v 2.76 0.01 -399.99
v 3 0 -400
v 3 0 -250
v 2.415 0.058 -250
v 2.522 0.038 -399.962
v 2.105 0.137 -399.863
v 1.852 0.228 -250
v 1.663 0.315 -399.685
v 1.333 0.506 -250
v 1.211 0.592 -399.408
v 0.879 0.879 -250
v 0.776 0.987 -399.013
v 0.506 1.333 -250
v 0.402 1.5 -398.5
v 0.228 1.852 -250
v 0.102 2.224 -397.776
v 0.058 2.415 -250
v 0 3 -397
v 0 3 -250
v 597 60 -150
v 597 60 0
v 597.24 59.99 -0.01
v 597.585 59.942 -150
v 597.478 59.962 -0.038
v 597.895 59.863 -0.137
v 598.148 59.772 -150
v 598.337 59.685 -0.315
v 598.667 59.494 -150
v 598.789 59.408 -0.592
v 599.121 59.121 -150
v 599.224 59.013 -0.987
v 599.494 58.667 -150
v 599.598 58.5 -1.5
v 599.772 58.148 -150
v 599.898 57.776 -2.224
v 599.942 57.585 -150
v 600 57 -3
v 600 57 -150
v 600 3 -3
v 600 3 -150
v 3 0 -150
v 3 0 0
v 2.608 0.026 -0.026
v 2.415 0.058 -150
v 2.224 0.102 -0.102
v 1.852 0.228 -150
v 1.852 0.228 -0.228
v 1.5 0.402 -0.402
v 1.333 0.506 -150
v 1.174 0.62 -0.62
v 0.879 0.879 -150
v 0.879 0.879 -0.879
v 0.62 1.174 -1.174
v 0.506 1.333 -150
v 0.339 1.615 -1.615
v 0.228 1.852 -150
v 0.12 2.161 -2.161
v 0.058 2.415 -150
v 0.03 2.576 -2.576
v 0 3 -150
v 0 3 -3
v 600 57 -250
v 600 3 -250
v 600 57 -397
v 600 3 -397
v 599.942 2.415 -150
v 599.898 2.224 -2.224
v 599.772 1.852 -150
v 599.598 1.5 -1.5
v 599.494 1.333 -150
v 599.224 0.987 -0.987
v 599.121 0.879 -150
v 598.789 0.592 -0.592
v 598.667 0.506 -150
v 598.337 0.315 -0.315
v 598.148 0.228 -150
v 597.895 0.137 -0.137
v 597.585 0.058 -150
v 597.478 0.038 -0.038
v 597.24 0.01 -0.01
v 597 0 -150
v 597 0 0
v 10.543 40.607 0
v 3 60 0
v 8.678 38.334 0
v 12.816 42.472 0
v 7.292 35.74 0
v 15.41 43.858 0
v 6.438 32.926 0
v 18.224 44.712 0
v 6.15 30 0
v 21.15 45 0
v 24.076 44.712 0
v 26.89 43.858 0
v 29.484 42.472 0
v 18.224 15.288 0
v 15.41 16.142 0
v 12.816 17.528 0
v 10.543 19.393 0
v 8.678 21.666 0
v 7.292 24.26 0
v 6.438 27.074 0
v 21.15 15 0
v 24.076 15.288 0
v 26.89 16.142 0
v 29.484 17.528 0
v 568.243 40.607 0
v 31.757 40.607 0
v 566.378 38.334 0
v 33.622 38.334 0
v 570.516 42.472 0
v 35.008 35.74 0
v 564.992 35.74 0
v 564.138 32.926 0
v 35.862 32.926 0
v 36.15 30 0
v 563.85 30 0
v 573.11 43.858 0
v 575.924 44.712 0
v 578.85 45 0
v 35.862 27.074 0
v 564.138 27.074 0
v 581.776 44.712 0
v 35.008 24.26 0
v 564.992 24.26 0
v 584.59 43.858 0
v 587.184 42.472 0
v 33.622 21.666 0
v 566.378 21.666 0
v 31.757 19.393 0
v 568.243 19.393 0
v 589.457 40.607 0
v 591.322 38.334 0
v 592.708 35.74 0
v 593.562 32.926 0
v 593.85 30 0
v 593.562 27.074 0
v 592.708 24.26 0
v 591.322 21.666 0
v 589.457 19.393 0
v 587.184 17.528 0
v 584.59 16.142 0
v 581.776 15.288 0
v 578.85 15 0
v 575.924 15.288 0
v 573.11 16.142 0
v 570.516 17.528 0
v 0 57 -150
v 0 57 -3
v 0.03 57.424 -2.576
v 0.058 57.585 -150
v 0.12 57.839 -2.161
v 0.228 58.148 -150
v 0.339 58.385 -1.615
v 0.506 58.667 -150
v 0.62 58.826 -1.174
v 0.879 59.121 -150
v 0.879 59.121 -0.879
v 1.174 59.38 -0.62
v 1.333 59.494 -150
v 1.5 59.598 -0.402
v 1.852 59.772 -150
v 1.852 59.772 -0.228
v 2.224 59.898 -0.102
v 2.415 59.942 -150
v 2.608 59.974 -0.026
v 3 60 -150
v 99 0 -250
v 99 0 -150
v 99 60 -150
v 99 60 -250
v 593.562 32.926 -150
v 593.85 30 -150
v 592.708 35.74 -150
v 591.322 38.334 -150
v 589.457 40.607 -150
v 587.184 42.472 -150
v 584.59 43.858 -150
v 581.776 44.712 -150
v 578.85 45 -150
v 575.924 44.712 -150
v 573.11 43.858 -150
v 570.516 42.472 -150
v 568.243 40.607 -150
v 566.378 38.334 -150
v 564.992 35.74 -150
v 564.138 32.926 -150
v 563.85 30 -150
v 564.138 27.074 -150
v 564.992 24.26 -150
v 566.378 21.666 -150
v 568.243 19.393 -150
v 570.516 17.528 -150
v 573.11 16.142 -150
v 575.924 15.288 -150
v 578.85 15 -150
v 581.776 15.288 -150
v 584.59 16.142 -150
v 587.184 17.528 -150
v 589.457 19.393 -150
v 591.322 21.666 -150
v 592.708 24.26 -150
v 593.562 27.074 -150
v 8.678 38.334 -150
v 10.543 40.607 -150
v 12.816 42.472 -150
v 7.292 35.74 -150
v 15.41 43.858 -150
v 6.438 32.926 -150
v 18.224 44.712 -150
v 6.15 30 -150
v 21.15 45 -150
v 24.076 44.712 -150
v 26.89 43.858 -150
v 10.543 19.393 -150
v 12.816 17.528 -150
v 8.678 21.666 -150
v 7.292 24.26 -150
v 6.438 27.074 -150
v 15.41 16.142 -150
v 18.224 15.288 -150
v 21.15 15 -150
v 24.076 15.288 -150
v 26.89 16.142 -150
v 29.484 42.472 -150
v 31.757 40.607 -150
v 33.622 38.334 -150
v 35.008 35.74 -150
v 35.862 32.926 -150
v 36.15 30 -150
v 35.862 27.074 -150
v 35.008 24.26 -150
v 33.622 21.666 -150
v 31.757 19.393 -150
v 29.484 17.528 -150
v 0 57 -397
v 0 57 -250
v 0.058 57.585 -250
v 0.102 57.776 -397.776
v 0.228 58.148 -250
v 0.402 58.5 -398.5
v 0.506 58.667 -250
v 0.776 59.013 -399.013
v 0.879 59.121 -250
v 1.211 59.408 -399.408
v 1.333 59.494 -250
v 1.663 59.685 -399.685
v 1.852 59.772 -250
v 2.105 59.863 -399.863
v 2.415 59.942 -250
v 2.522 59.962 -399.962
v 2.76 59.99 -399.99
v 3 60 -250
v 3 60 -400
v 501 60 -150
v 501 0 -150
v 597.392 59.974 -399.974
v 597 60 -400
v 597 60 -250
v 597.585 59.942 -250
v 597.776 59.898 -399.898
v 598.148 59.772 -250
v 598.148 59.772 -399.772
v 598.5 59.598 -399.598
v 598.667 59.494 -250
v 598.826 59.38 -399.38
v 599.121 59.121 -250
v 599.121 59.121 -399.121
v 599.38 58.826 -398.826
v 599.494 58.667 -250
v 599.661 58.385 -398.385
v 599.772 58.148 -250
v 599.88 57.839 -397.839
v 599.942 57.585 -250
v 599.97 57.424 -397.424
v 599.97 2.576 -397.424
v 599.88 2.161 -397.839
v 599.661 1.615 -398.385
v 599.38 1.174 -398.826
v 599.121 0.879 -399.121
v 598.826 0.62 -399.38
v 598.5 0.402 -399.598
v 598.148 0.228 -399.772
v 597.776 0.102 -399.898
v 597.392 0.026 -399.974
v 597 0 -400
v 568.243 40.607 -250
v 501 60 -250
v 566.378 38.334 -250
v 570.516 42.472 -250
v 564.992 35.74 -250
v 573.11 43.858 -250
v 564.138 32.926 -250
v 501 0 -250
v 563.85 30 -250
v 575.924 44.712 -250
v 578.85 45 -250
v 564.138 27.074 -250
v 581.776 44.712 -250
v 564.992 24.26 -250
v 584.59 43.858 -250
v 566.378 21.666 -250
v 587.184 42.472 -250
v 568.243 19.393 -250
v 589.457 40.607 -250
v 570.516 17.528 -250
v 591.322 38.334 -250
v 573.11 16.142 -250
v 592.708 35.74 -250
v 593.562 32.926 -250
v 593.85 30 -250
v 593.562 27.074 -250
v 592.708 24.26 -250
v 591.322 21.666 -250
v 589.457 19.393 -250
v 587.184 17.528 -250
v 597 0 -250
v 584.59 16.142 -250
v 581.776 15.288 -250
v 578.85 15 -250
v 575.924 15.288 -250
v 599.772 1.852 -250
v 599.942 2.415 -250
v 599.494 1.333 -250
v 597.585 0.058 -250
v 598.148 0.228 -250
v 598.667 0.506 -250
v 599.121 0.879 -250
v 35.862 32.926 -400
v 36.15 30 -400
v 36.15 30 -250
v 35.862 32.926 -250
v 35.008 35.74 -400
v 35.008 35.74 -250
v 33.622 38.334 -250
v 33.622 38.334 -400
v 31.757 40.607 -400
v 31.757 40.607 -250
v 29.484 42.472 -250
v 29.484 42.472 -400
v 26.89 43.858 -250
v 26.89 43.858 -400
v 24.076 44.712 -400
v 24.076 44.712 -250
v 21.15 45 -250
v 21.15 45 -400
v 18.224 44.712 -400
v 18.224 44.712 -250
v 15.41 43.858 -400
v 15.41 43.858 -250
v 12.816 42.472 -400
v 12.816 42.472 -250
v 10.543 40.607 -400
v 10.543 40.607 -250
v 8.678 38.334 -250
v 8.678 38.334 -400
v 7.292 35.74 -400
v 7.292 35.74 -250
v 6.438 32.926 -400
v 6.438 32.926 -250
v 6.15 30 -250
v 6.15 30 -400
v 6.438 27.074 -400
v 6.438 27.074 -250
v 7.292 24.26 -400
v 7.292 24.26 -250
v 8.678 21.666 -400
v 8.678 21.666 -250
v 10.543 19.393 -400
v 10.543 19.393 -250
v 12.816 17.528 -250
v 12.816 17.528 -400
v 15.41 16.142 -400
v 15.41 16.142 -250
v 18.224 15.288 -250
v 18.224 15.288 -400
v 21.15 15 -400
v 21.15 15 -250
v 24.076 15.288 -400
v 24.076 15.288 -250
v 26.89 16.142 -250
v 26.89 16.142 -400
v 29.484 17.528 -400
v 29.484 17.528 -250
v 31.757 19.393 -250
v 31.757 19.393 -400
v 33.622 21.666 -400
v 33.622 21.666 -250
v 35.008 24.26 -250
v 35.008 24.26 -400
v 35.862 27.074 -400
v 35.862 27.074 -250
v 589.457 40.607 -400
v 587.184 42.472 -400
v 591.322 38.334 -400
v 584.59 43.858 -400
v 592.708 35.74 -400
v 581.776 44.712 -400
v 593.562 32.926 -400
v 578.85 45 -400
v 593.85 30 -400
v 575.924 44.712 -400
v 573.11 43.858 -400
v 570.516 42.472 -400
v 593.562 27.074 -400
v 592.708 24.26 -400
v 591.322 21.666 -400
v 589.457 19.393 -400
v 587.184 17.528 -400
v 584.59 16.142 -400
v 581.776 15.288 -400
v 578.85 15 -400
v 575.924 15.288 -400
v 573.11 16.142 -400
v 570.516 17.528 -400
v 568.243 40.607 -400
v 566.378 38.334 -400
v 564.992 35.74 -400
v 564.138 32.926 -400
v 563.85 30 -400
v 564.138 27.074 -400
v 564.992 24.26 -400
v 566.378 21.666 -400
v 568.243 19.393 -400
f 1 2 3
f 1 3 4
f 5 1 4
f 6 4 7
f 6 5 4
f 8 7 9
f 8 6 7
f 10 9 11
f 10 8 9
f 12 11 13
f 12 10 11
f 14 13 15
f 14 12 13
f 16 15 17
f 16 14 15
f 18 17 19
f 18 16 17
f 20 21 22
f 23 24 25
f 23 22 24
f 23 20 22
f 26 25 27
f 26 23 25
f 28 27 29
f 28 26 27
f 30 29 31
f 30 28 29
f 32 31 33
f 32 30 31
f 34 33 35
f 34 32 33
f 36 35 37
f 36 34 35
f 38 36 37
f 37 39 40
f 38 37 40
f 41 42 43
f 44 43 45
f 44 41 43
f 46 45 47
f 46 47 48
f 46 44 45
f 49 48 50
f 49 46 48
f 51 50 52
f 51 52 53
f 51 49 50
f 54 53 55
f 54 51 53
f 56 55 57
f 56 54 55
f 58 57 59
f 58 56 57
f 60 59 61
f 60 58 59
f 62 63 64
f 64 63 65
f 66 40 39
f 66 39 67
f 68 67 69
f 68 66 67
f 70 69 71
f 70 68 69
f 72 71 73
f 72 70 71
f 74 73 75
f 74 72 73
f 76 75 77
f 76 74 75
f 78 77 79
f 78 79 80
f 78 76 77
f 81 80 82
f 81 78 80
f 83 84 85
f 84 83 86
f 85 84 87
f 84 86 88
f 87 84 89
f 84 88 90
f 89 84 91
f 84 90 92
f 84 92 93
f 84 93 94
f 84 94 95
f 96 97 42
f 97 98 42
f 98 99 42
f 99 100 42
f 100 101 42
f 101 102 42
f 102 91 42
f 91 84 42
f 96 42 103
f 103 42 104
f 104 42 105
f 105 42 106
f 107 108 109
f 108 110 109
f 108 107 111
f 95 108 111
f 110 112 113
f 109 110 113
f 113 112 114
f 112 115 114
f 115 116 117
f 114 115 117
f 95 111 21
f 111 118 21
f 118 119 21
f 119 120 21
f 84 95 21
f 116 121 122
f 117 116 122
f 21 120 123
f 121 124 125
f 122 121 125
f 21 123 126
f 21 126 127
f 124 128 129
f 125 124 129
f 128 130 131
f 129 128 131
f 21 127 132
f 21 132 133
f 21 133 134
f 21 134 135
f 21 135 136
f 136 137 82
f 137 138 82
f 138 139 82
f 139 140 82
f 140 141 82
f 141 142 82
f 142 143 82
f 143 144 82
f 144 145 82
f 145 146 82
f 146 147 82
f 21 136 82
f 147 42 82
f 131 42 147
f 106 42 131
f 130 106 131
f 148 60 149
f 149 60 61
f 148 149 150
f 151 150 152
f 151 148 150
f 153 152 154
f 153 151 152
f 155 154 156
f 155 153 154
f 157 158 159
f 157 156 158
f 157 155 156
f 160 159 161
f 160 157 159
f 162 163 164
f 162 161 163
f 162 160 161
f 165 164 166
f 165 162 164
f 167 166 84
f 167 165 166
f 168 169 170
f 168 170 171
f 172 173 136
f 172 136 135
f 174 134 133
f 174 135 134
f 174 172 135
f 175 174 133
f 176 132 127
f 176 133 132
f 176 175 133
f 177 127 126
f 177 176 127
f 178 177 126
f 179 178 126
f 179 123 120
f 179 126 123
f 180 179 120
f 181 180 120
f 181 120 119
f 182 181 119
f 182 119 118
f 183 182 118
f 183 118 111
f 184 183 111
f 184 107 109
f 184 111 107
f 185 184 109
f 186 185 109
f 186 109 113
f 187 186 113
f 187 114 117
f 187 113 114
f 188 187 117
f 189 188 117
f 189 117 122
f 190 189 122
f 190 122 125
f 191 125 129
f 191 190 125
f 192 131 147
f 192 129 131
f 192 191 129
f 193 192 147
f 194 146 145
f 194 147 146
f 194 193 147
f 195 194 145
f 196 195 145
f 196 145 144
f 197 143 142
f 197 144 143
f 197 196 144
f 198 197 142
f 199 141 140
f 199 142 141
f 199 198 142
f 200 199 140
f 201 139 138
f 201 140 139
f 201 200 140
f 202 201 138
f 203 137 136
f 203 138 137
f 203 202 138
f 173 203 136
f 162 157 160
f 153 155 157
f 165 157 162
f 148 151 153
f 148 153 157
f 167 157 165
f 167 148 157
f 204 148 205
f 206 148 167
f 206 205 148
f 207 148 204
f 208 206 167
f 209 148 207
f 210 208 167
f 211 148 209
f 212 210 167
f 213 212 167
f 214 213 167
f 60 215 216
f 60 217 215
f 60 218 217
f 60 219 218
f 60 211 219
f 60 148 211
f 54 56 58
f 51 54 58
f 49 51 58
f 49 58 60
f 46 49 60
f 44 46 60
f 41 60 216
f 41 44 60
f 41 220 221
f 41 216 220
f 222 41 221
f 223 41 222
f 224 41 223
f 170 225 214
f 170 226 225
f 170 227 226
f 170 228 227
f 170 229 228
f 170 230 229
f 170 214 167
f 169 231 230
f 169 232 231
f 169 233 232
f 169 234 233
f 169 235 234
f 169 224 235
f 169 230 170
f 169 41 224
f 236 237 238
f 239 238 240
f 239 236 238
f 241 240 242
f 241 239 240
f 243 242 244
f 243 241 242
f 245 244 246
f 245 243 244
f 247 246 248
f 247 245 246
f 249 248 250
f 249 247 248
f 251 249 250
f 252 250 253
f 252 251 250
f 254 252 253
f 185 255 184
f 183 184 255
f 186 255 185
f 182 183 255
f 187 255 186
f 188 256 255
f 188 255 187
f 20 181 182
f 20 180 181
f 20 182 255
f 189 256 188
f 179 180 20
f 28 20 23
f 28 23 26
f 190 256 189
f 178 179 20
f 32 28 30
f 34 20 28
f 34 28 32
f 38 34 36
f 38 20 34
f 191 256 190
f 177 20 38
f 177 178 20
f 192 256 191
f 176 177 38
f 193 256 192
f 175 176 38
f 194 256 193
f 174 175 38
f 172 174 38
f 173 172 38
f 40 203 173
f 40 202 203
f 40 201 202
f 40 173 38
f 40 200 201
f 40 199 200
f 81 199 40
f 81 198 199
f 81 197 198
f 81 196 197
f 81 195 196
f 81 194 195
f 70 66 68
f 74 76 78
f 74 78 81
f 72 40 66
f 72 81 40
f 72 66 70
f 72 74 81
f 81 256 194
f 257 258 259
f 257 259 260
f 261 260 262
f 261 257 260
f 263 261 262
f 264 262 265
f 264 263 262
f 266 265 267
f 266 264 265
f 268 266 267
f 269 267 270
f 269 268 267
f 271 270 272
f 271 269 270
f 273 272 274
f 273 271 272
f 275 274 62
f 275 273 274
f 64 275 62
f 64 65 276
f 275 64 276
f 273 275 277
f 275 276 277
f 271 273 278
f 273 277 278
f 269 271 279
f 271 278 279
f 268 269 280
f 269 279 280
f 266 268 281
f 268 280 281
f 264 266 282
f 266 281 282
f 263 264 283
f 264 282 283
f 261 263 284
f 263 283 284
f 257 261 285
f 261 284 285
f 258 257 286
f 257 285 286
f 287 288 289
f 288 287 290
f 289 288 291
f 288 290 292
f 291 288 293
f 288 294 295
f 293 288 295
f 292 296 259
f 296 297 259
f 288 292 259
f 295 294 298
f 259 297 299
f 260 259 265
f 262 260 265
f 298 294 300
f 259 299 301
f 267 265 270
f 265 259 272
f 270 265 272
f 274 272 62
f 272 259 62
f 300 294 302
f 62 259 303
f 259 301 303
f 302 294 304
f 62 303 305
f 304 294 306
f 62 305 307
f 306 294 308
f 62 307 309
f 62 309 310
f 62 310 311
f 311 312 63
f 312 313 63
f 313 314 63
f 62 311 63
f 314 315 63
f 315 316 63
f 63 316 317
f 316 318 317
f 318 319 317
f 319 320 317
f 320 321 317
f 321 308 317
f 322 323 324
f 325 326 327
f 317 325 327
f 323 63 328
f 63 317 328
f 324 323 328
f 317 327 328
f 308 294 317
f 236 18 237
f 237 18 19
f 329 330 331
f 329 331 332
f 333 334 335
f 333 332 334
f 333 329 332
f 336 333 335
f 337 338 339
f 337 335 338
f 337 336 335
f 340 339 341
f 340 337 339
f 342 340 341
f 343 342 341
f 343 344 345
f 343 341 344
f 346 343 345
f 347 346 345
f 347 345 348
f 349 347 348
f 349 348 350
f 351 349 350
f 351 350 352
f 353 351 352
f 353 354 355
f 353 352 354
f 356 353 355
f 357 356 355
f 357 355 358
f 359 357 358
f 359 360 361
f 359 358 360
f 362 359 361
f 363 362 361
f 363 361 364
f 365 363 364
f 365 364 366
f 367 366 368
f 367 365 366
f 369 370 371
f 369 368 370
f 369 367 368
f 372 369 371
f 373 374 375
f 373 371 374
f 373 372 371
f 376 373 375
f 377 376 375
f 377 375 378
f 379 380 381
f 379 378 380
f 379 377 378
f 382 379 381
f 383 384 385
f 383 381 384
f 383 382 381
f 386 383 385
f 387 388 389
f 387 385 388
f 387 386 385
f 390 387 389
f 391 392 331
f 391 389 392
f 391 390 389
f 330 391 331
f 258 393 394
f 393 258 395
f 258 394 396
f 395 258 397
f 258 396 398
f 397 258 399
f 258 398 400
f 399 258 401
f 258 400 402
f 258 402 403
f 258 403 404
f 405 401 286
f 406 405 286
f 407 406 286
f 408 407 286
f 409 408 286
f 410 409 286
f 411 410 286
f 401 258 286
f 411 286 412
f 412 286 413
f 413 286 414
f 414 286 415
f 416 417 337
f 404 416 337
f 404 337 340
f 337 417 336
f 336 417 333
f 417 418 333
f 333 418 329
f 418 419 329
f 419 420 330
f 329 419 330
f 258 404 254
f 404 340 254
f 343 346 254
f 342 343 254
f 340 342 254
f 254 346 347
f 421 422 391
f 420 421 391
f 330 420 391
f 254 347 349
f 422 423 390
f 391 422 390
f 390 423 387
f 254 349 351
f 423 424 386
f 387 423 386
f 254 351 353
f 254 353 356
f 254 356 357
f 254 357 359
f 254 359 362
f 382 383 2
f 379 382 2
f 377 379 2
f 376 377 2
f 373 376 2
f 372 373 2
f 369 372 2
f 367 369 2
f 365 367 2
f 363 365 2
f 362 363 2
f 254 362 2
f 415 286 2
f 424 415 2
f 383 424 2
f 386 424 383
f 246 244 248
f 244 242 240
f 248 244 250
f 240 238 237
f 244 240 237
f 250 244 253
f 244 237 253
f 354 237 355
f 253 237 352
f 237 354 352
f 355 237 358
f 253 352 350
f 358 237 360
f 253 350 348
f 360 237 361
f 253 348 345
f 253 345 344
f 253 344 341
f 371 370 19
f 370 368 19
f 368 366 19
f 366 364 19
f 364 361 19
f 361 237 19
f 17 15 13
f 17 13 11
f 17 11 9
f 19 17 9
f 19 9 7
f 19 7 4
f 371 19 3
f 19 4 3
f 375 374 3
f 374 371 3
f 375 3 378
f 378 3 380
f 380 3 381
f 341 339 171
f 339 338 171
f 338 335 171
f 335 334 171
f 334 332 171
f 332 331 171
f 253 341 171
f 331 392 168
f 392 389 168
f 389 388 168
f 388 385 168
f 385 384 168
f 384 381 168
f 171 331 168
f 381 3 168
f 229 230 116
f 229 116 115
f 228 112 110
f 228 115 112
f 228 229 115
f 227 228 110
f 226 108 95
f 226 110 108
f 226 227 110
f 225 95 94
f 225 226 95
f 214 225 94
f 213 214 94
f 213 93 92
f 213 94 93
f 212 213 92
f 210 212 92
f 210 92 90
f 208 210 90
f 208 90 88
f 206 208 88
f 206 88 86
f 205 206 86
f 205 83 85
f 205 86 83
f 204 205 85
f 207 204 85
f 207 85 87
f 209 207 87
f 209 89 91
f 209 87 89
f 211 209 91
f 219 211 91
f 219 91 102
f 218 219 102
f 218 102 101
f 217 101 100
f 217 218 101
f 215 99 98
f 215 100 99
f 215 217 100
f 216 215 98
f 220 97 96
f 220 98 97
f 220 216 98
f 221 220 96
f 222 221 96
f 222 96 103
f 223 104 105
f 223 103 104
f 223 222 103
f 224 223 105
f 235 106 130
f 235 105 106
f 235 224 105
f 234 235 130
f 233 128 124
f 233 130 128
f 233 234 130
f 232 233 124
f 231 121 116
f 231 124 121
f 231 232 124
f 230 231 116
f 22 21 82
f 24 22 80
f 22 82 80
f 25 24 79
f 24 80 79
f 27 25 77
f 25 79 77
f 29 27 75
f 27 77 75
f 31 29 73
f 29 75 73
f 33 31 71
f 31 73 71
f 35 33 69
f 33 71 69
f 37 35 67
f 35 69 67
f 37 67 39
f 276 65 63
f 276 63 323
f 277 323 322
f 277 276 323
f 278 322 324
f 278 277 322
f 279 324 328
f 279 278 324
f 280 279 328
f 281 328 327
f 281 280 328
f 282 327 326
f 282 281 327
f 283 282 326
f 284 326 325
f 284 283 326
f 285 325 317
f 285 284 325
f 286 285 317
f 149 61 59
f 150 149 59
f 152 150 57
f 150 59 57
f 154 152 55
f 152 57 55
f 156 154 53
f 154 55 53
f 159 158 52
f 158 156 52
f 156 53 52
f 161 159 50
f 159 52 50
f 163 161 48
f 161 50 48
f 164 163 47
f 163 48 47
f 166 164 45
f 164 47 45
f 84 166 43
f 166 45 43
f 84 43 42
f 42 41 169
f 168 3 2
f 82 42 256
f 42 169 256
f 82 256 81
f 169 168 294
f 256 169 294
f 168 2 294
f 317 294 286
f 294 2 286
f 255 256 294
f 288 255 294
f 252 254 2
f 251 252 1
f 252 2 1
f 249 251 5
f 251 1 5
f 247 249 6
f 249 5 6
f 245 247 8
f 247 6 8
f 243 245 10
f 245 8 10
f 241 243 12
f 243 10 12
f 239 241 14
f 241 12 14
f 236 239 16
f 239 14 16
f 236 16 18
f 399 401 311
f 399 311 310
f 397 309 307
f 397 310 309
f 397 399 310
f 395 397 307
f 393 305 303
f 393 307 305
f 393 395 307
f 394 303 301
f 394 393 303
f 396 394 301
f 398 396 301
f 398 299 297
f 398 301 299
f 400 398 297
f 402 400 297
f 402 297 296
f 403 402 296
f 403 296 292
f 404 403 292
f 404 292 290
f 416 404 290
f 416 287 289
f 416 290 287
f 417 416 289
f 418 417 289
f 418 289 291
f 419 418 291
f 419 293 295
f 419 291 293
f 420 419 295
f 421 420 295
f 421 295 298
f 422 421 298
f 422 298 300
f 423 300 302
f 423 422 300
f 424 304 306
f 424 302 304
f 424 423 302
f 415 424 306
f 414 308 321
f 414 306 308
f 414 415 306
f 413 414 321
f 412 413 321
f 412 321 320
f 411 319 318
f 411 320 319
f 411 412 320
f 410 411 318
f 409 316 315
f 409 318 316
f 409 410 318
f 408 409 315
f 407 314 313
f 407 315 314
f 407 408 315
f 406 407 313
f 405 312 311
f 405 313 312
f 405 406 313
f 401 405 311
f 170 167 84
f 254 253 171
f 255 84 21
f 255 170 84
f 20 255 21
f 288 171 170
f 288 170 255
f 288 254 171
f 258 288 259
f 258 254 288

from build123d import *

# Parameters (mm, degrees)
ESTRUSIONE_ESTRUSIONE1_DEPTH  = 60
TAGLIO_ESTRUSIONE2_DEPTH      = 724.602100605
TAGLIO_ESTRUSIONE2_DEPTH_BACK = 724.602100605
SCHIZZO3_OUTSIDE_W            = 746.72
SCHIZZO3_OUTSIDE_H            = 206.72
SCHIZZO3_OUTSIDE_R            = 15
SCHIZZO4_W                    = 100
SCHIZZO4_H                    = 100
TAGLIO_ESTRUSIONE3_DEPTH      = 724.602100605


with BuildPart() as part:
    # Schizzo1 → Estrusione-Estrusione1 (new body)
    with BuildSketch(Plane(origin=(0, 0, 0), x_dir=(1, 0, 0), z_dir=(0, 1, 0))):
        with BuildLine():
            Line((3, 0), (597, 0))
            ThreePointArc((597, 0), (599.121320344, 0.878679656), (600, 3))
            Line((600, 3), (600, 397))
            ThreePointArc((600, 397), (599.121320344, 399.121320344), (597, 400))
            Line((597, 400), (3, 400))
            ThreePointArc((3, 400), (0.878679656, 399.121320344), (0, 397))
            Line((0, 397), (0, 3))
            ThreePointArc((0, 3), (0.878679656, 0.878679656), (3, 0))
        make_face()
    extrude(amount=ESTRUSIONE_ESTRUSIONE1_DEPTH)

    # Schizzo3 outside → Taglio-Estrusione2 (cut, two sides: drawn at the far end of the back side and taken through both)
    # profile 1 of 3: a face of its own
    with BuildSketch(Plane.XY.offset(-TAGLIO_ESTRUSIONE2_DEPTH_BACK)):
        with Locations((300, 30)):
            Rectangle(SCHIZZO3_OUTSIDE_W, SCHIZZO3_OUTSIDE_H)
        with BuildLine():
            Line((3, 60), (597, 60))
            ThreePointArc((597, 60), (599.121320344, 59.121320344), (600, 57))
            Line((600, 57), (600, 3))
            ThreePointArc((600, 3), (599.121320344, 0.878679656), (597, 0))
            Line((597, 0), (3, 0))
            ThreePointArc((3, 0), (0.878679656, 0.878679656), (0, 3))
            Line((0, 3), (0, 57))
            ThreePointArc((0, 57), (0.878679656, 59.121320344), (3, 60))
        make_face(mode=Mode.SUBTRACT)
    # profile 2 of 3: a face of its own
    with BuildSketch(Plane.XY.offset(-TAGLIO_ESTRUSIONE2_DEPTH_BACK)):
        with Locations((21.15, 30)):
            Circle(SCHIZZO3_OUTSIDE_R)
    # profile 3 of 3: a face of its own
    with BuildSketch(Plane.XY.offset(-TAGLIO_ESTRUSIONE2_DEPTH_BACK)):
        with Locations((578.85, 30)):
            Circle(SCHIZZO3_OUTSIDE_R)
    extrude(amount=TAGLIO_ESTRUSIONE2_DEPTH + TAGLIO_ESTRUSIONE2_DEPTH_BACK, mode=Mode.SUBTRACT)

    # Schizzo4 → Taglio-Estrusione3 (cut, through all)
    with BuildSketch(Plane(origin=(0, 0, 0), x_dir=(1, 0, 0), z_dir=(0, 1, 0))):
        with Locations((49, 200)):
            Rectangle(SCHIZZO4_W, SCHIZZO4_H)
        with Locations((551, 200)):
            Rectangle(SCHIZZO4_W, SCHIZZO4_H)
    extrude(amount=TAGLIO_ESTRUSIONE3_DEPTH, mode=Mode.SUBTRACT)


solid = part.part
